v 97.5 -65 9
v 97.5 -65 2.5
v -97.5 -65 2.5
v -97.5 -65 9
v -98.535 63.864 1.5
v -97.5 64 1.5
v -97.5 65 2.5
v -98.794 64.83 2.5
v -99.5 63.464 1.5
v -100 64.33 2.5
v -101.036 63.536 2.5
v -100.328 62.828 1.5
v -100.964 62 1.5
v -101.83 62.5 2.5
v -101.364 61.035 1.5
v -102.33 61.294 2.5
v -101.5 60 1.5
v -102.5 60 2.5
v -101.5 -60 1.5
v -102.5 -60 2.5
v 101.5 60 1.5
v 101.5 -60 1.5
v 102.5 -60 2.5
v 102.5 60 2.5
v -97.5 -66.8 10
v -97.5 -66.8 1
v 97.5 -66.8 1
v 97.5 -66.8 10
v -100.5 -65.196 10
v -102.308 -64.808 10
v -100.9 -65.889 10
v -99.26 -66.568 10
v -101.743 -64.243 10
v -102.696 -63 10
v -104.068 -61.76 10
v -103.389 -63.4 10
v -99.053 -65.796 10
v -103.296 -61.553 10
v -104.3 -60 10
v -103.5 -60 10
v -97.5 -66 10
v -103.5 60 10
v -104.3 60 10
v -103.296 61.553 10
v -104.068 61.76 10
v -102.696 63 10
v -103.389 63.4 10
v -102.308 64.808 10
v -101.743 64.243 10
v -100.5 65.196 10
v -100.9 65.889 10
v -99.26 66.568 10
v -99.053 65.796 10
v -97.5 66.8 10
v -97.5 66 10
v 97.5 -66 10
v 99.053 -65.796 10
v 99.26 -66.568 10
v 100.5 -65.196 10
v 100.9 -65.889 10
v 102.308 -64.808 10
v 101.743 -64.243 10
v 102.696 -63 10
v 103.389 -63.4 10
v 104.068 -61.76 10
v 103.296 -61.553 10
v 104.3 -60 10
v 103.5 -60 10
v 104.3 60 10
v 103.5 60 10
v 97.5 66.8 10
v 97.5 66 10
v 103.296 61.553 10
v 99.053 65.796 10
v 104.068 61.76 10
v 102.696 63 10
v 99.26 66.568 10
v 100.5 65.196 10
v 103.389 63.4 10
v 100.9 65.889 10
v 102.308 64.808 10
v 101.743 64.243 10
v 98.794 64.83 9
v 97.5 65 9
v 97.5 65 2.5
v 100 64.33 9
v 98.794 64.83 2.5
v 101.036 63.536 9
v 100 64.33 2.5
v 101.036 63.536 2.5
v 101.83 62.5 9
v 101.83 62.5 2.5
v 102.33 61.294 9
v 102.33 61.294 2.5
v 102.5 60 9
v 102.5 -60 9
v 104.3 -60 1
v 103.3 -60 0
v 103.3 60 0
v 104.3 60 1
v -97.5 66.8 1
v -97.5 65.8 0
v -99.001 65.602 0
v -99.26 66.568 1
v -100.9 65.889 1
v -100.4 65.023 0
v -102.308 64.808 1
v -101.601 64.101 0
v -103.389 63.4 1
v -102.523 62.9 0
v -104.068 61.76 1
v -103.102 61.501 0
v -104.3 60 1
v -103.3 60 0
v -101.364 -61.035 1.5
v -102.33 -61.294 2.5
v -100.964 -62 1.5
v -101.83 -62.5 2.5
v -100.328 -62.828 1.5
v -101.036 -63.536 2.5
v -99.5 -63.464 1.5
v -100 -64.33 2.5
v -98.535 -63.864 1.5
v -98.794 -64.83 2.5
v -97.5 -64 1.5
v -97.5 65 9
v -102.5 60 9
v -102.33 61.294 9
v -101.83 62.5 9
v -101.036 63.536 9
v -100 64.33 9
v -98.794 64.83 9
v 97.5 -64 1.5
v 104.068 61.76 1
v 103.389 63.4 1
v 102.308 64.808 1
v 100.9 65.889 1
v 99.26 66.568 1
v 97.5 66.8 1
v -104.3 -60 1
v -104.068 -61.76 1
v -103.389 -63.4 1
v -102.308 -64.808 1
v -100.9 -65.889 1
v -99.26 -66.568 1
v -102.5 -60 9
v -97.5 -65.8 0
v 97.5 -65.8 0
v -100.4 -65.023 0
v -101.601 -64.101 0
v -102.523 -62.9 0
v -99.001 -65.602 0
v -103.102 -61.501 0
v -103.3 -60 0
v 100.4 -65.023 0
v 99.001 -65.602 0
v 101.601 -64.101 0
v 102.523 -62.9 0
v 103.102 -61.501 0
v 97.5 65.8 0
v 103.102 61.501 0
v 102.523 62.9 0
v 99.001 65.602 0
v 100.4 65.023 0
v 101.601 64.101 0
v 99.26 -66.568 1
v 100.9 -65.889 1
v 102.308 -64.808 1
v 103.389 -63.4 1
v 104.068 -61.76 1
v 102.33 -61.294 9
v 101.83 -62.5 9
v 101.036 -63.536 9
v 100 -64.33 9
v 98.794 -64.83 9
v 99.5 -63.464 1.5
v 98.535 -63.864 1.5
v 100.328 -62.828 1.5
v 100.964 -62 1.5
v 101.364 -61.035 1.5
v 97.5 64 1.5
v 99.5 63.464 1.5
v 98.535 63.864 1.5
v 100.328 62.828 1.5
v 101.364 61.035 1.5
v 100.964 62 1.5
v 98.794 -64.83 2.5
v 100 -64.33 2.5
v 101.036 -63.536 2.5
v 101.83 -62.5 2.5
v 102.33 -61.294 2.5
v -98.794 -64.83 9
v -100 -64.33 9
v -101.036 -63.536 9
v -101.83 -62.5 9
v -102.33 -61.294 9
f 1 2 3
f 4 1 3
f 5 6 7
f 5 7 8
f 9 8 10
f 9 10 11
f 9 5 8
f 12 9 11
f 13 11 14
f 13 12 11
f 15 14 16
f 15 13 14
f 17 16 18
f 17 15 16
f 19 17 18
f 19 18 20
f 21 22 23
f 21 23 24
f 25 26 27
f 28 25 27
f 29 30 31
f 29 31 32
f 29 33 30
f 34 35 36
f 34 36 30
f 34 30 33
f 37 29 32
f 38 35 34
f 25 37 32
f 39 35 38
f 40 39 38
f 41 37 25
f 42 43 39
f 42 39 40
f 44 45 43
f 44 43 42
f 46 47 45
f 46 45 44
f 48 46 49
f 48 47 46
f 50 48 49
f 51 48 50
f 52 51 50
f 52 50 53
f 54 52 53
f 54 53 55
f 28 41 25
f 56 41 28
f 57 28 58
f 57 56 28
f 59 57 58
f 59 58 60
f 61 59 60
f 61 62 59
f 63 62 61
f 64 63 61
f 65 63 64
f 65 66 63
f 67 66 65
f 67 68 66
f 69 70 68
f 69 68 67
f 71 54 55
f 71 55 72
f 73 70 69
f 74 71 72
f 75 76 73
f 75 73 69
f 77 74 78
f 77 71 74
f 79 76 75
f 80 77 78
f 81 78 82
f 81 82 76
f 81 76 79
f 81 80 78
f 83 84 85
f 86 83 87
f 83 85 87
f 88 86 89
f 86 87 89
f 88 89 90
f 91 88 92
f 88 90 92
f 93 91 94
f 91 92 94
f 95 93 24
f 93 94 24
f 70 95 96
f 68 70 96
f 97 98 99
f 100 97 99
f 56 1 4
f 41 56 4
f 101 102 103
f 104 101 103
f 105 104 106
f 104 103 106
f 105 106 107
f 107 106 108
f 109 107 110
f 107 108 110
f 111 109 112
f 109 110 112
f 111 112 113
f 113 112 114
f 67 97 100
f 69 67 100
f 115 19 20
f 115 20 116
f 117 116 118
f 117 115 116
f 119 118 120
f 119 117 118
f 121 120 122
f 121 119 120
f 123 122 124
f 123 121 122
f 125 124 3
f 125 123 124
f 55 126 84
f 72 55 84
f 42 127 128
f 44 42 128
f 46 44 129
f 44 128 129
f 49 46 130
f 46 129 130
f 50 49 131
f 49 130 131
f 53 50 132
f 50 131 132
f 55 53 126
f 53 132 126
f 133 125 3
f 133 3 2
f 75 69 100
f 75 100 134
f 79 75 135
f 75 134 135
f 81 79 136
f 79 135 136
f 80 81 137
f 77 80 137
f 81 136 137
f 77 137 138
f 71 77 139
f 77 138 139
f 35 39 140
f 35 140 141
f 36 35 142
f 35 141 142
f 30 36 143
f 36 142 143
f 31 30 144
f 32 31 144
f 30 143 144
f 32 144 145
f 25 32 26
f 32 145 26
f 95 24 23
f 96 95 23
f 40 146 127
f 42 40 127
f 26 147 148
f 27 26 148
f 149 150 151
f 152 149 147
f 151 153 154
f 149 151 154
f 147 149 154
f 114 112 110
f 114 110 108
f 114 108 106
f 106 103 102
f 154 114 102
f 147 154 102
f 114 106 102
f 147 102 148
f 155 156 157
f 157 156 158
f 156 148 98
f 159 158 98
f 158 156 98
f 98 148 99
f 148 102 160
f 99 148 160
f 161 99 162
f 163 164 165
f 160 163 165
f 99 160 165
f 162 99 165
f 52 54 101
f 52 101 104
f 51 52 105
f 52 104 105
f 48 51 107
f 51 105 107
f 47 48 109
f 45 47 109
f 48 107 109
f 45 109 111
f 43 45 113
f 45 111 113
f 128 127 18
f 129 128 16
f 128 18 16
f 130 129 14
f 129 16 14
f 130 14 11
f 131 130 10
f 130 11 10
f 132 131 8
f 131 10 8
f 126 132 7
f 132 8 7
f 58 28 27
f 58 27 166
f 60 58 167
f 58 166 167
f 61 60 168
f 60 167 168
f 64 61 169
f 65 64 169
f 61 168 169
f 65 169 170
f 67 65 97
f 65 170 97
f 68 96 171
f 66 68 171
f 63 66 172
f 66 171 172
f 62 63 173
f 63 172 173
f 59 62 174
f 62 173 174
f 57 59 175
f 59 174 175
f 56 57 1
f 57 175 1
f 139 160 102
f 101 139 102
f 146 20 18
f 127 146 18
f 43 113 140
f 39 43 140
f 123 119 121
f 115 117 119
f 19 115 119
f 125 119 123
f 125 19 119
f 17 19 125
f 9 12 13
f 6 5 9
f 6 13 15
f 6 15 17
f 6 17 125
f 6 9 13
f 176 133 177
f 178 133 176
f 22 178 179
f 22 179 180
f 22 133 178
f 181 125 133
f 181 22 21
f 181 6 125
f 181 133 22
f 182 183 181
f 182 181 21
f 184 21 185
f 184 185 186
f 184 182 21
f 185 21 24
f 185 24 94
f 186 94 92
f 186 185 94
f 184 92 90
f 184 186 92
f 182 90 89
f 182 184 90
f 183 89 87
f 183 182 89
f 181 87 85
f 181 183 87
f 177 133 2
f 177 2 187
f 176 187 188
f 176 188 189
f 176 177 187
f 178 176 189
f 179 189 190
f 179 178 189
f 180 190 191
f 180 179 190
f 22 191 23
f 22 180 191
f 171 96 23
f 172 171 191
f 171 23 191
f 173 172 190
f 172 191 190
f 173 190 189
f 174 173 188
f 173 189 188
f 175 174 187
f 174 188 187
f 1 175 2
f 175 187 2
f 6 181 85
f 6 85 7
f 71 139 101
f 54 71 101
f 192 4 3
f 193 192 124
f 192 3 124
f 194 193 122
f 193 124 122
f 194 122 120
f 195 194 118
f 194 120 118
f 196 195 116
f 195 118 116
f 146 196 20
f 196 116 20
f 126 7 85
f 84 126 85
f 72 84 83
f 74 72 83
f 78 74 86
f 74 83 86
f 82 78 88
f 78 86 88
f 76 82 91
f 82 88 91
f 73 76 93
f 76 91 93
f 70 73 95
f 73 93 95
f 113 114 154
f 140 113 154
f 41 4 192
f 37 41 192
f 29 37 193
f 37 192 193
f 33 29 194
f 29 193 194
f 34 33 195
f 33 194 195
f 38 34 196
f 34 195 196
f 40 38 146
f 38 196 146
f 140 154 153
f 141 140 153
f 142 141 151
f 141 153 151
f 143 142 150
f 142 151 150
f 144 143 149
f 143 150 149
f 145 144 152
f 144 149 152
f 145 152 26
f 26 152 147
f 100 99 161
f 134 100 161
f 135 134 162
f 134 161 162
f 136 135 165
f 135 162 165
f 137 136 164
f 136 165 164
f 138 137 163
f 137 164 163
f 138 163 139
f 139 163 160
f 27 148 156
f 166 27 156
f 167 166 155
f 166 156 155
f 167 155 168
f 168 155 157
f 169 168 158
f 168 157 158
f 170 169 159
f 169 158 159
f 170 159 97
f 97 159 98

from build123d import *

# Parameters (mm, degrees)
F1_DEPTH = 1.5
F2_DEPTH = 10
F3_SIZE  = 1


with BuildPart() as f1:
    # F0 (on Top) → F1 (new body)
    with BuildSketch(Plane.XY):
        with BuildLine():
            ThreePointArc((102.5, 60), (101.035534, 63.535534), (97.5, 65))
            Line((97.5, 65), (-97.5, 65))
            ThreePointArc((-97.5, 65), (-101.035534, 63.535534), (-102.5, 60))
            Line((-102.5, 60), (-102.5, -60))
            ThreePointArc((-102.5, -60), (-101.035534, -63.535534), (-97.5, -65))
            Line((-97.5, -65), (97.5, -65))
            ThreePointArc((97.5, -65), (101.035534, -63.535534), (102.5, -60))
            Line((102.5, -60), (102.5, 60))
        make_face()
    extrude(amount=F1_DEPTH)

    # F0 (on Top) → F2 (join)
    with BuildSketch(Plane.XY):
        with BuildLine():
            Line((104.3, -60), (104.3, 60))
            ThreePointArc((104.3, 60), (102.308326, 64.808326), (97.5, 66.8))
            Line((97.5, 66.8), (-97.5, 66.8))
            ThreePointArc((-97.5, 66.8), (-102.308326, 64.808326), (-104.3, 60))
            Line((-104.3, 60), (-104.3, -60))
            ThreePointArc((-104.3, -60), (-102.308326, -64.808326), (-97.5, -66.8))
            Line((-97.5, -66.8), (97.5, -66.8))
            ThreePointArc((97.5, -66.8), (102.308326, -64.808326), (104.3, -60))
        make_face()
        with BuildLine():
            Line((-97.5, 65), (97.5, 65))
            ThreePointArc((97.5, 65), (101.035534, 63.535534), (102.5, 60))
            Line((102.5, 60), (102.5, -60))
            ThreePointArc((102.5, -60), (101.035534, -63.535534), (97.5, -65))
            Line((97.5, -65), (-97.5, -65))
            ThreePointArc((-97.5, -65), (-101.035534, -63.535534), (-102.5, -60))
            Line((-102.5, -60), (-102.5, 60))
            ThreePointArc((-102.5, 60), (-101.035534, 63.535534), (-97.5, 65))
        make_face(mode=Mode.SUBTRACT)
    extrude(amount=F2_DEPTH)

    # F3
    f3_edges = [f1.edges().sort_by_distance(p)[0] for p in [
        (102.308326, -64.808326, 0),
        (104.3, 0, 0),
        (102.308326, 64.808326, 0),
        (0, 66.8, 0),
        (-102.308326, 64.808326, 0),
        (-104.3, 0, 0),
        (-102.308326, -64.808326, 0),
        (0, -66.8, 0),
        (101.035534, 63.535534, 1.5),
        (0, 65, 1.5),
        (-101.035534, 63.535534, 1.5),
        (-102.5, 0, 1.5),
        (-101.035534, -63.535534, 1.5),
        (0, -65, 1.5),
        (101.035534, -63.535534, 1.5),
        (102.5, 0, 1.5),
        (97.5, 65, 5.75),
        (0, 65, 10),
        (-97.5, 65, 5.75),
    ]]
    chamfer(f3_edges, length=F3_SIZE)


solid = f1.part
